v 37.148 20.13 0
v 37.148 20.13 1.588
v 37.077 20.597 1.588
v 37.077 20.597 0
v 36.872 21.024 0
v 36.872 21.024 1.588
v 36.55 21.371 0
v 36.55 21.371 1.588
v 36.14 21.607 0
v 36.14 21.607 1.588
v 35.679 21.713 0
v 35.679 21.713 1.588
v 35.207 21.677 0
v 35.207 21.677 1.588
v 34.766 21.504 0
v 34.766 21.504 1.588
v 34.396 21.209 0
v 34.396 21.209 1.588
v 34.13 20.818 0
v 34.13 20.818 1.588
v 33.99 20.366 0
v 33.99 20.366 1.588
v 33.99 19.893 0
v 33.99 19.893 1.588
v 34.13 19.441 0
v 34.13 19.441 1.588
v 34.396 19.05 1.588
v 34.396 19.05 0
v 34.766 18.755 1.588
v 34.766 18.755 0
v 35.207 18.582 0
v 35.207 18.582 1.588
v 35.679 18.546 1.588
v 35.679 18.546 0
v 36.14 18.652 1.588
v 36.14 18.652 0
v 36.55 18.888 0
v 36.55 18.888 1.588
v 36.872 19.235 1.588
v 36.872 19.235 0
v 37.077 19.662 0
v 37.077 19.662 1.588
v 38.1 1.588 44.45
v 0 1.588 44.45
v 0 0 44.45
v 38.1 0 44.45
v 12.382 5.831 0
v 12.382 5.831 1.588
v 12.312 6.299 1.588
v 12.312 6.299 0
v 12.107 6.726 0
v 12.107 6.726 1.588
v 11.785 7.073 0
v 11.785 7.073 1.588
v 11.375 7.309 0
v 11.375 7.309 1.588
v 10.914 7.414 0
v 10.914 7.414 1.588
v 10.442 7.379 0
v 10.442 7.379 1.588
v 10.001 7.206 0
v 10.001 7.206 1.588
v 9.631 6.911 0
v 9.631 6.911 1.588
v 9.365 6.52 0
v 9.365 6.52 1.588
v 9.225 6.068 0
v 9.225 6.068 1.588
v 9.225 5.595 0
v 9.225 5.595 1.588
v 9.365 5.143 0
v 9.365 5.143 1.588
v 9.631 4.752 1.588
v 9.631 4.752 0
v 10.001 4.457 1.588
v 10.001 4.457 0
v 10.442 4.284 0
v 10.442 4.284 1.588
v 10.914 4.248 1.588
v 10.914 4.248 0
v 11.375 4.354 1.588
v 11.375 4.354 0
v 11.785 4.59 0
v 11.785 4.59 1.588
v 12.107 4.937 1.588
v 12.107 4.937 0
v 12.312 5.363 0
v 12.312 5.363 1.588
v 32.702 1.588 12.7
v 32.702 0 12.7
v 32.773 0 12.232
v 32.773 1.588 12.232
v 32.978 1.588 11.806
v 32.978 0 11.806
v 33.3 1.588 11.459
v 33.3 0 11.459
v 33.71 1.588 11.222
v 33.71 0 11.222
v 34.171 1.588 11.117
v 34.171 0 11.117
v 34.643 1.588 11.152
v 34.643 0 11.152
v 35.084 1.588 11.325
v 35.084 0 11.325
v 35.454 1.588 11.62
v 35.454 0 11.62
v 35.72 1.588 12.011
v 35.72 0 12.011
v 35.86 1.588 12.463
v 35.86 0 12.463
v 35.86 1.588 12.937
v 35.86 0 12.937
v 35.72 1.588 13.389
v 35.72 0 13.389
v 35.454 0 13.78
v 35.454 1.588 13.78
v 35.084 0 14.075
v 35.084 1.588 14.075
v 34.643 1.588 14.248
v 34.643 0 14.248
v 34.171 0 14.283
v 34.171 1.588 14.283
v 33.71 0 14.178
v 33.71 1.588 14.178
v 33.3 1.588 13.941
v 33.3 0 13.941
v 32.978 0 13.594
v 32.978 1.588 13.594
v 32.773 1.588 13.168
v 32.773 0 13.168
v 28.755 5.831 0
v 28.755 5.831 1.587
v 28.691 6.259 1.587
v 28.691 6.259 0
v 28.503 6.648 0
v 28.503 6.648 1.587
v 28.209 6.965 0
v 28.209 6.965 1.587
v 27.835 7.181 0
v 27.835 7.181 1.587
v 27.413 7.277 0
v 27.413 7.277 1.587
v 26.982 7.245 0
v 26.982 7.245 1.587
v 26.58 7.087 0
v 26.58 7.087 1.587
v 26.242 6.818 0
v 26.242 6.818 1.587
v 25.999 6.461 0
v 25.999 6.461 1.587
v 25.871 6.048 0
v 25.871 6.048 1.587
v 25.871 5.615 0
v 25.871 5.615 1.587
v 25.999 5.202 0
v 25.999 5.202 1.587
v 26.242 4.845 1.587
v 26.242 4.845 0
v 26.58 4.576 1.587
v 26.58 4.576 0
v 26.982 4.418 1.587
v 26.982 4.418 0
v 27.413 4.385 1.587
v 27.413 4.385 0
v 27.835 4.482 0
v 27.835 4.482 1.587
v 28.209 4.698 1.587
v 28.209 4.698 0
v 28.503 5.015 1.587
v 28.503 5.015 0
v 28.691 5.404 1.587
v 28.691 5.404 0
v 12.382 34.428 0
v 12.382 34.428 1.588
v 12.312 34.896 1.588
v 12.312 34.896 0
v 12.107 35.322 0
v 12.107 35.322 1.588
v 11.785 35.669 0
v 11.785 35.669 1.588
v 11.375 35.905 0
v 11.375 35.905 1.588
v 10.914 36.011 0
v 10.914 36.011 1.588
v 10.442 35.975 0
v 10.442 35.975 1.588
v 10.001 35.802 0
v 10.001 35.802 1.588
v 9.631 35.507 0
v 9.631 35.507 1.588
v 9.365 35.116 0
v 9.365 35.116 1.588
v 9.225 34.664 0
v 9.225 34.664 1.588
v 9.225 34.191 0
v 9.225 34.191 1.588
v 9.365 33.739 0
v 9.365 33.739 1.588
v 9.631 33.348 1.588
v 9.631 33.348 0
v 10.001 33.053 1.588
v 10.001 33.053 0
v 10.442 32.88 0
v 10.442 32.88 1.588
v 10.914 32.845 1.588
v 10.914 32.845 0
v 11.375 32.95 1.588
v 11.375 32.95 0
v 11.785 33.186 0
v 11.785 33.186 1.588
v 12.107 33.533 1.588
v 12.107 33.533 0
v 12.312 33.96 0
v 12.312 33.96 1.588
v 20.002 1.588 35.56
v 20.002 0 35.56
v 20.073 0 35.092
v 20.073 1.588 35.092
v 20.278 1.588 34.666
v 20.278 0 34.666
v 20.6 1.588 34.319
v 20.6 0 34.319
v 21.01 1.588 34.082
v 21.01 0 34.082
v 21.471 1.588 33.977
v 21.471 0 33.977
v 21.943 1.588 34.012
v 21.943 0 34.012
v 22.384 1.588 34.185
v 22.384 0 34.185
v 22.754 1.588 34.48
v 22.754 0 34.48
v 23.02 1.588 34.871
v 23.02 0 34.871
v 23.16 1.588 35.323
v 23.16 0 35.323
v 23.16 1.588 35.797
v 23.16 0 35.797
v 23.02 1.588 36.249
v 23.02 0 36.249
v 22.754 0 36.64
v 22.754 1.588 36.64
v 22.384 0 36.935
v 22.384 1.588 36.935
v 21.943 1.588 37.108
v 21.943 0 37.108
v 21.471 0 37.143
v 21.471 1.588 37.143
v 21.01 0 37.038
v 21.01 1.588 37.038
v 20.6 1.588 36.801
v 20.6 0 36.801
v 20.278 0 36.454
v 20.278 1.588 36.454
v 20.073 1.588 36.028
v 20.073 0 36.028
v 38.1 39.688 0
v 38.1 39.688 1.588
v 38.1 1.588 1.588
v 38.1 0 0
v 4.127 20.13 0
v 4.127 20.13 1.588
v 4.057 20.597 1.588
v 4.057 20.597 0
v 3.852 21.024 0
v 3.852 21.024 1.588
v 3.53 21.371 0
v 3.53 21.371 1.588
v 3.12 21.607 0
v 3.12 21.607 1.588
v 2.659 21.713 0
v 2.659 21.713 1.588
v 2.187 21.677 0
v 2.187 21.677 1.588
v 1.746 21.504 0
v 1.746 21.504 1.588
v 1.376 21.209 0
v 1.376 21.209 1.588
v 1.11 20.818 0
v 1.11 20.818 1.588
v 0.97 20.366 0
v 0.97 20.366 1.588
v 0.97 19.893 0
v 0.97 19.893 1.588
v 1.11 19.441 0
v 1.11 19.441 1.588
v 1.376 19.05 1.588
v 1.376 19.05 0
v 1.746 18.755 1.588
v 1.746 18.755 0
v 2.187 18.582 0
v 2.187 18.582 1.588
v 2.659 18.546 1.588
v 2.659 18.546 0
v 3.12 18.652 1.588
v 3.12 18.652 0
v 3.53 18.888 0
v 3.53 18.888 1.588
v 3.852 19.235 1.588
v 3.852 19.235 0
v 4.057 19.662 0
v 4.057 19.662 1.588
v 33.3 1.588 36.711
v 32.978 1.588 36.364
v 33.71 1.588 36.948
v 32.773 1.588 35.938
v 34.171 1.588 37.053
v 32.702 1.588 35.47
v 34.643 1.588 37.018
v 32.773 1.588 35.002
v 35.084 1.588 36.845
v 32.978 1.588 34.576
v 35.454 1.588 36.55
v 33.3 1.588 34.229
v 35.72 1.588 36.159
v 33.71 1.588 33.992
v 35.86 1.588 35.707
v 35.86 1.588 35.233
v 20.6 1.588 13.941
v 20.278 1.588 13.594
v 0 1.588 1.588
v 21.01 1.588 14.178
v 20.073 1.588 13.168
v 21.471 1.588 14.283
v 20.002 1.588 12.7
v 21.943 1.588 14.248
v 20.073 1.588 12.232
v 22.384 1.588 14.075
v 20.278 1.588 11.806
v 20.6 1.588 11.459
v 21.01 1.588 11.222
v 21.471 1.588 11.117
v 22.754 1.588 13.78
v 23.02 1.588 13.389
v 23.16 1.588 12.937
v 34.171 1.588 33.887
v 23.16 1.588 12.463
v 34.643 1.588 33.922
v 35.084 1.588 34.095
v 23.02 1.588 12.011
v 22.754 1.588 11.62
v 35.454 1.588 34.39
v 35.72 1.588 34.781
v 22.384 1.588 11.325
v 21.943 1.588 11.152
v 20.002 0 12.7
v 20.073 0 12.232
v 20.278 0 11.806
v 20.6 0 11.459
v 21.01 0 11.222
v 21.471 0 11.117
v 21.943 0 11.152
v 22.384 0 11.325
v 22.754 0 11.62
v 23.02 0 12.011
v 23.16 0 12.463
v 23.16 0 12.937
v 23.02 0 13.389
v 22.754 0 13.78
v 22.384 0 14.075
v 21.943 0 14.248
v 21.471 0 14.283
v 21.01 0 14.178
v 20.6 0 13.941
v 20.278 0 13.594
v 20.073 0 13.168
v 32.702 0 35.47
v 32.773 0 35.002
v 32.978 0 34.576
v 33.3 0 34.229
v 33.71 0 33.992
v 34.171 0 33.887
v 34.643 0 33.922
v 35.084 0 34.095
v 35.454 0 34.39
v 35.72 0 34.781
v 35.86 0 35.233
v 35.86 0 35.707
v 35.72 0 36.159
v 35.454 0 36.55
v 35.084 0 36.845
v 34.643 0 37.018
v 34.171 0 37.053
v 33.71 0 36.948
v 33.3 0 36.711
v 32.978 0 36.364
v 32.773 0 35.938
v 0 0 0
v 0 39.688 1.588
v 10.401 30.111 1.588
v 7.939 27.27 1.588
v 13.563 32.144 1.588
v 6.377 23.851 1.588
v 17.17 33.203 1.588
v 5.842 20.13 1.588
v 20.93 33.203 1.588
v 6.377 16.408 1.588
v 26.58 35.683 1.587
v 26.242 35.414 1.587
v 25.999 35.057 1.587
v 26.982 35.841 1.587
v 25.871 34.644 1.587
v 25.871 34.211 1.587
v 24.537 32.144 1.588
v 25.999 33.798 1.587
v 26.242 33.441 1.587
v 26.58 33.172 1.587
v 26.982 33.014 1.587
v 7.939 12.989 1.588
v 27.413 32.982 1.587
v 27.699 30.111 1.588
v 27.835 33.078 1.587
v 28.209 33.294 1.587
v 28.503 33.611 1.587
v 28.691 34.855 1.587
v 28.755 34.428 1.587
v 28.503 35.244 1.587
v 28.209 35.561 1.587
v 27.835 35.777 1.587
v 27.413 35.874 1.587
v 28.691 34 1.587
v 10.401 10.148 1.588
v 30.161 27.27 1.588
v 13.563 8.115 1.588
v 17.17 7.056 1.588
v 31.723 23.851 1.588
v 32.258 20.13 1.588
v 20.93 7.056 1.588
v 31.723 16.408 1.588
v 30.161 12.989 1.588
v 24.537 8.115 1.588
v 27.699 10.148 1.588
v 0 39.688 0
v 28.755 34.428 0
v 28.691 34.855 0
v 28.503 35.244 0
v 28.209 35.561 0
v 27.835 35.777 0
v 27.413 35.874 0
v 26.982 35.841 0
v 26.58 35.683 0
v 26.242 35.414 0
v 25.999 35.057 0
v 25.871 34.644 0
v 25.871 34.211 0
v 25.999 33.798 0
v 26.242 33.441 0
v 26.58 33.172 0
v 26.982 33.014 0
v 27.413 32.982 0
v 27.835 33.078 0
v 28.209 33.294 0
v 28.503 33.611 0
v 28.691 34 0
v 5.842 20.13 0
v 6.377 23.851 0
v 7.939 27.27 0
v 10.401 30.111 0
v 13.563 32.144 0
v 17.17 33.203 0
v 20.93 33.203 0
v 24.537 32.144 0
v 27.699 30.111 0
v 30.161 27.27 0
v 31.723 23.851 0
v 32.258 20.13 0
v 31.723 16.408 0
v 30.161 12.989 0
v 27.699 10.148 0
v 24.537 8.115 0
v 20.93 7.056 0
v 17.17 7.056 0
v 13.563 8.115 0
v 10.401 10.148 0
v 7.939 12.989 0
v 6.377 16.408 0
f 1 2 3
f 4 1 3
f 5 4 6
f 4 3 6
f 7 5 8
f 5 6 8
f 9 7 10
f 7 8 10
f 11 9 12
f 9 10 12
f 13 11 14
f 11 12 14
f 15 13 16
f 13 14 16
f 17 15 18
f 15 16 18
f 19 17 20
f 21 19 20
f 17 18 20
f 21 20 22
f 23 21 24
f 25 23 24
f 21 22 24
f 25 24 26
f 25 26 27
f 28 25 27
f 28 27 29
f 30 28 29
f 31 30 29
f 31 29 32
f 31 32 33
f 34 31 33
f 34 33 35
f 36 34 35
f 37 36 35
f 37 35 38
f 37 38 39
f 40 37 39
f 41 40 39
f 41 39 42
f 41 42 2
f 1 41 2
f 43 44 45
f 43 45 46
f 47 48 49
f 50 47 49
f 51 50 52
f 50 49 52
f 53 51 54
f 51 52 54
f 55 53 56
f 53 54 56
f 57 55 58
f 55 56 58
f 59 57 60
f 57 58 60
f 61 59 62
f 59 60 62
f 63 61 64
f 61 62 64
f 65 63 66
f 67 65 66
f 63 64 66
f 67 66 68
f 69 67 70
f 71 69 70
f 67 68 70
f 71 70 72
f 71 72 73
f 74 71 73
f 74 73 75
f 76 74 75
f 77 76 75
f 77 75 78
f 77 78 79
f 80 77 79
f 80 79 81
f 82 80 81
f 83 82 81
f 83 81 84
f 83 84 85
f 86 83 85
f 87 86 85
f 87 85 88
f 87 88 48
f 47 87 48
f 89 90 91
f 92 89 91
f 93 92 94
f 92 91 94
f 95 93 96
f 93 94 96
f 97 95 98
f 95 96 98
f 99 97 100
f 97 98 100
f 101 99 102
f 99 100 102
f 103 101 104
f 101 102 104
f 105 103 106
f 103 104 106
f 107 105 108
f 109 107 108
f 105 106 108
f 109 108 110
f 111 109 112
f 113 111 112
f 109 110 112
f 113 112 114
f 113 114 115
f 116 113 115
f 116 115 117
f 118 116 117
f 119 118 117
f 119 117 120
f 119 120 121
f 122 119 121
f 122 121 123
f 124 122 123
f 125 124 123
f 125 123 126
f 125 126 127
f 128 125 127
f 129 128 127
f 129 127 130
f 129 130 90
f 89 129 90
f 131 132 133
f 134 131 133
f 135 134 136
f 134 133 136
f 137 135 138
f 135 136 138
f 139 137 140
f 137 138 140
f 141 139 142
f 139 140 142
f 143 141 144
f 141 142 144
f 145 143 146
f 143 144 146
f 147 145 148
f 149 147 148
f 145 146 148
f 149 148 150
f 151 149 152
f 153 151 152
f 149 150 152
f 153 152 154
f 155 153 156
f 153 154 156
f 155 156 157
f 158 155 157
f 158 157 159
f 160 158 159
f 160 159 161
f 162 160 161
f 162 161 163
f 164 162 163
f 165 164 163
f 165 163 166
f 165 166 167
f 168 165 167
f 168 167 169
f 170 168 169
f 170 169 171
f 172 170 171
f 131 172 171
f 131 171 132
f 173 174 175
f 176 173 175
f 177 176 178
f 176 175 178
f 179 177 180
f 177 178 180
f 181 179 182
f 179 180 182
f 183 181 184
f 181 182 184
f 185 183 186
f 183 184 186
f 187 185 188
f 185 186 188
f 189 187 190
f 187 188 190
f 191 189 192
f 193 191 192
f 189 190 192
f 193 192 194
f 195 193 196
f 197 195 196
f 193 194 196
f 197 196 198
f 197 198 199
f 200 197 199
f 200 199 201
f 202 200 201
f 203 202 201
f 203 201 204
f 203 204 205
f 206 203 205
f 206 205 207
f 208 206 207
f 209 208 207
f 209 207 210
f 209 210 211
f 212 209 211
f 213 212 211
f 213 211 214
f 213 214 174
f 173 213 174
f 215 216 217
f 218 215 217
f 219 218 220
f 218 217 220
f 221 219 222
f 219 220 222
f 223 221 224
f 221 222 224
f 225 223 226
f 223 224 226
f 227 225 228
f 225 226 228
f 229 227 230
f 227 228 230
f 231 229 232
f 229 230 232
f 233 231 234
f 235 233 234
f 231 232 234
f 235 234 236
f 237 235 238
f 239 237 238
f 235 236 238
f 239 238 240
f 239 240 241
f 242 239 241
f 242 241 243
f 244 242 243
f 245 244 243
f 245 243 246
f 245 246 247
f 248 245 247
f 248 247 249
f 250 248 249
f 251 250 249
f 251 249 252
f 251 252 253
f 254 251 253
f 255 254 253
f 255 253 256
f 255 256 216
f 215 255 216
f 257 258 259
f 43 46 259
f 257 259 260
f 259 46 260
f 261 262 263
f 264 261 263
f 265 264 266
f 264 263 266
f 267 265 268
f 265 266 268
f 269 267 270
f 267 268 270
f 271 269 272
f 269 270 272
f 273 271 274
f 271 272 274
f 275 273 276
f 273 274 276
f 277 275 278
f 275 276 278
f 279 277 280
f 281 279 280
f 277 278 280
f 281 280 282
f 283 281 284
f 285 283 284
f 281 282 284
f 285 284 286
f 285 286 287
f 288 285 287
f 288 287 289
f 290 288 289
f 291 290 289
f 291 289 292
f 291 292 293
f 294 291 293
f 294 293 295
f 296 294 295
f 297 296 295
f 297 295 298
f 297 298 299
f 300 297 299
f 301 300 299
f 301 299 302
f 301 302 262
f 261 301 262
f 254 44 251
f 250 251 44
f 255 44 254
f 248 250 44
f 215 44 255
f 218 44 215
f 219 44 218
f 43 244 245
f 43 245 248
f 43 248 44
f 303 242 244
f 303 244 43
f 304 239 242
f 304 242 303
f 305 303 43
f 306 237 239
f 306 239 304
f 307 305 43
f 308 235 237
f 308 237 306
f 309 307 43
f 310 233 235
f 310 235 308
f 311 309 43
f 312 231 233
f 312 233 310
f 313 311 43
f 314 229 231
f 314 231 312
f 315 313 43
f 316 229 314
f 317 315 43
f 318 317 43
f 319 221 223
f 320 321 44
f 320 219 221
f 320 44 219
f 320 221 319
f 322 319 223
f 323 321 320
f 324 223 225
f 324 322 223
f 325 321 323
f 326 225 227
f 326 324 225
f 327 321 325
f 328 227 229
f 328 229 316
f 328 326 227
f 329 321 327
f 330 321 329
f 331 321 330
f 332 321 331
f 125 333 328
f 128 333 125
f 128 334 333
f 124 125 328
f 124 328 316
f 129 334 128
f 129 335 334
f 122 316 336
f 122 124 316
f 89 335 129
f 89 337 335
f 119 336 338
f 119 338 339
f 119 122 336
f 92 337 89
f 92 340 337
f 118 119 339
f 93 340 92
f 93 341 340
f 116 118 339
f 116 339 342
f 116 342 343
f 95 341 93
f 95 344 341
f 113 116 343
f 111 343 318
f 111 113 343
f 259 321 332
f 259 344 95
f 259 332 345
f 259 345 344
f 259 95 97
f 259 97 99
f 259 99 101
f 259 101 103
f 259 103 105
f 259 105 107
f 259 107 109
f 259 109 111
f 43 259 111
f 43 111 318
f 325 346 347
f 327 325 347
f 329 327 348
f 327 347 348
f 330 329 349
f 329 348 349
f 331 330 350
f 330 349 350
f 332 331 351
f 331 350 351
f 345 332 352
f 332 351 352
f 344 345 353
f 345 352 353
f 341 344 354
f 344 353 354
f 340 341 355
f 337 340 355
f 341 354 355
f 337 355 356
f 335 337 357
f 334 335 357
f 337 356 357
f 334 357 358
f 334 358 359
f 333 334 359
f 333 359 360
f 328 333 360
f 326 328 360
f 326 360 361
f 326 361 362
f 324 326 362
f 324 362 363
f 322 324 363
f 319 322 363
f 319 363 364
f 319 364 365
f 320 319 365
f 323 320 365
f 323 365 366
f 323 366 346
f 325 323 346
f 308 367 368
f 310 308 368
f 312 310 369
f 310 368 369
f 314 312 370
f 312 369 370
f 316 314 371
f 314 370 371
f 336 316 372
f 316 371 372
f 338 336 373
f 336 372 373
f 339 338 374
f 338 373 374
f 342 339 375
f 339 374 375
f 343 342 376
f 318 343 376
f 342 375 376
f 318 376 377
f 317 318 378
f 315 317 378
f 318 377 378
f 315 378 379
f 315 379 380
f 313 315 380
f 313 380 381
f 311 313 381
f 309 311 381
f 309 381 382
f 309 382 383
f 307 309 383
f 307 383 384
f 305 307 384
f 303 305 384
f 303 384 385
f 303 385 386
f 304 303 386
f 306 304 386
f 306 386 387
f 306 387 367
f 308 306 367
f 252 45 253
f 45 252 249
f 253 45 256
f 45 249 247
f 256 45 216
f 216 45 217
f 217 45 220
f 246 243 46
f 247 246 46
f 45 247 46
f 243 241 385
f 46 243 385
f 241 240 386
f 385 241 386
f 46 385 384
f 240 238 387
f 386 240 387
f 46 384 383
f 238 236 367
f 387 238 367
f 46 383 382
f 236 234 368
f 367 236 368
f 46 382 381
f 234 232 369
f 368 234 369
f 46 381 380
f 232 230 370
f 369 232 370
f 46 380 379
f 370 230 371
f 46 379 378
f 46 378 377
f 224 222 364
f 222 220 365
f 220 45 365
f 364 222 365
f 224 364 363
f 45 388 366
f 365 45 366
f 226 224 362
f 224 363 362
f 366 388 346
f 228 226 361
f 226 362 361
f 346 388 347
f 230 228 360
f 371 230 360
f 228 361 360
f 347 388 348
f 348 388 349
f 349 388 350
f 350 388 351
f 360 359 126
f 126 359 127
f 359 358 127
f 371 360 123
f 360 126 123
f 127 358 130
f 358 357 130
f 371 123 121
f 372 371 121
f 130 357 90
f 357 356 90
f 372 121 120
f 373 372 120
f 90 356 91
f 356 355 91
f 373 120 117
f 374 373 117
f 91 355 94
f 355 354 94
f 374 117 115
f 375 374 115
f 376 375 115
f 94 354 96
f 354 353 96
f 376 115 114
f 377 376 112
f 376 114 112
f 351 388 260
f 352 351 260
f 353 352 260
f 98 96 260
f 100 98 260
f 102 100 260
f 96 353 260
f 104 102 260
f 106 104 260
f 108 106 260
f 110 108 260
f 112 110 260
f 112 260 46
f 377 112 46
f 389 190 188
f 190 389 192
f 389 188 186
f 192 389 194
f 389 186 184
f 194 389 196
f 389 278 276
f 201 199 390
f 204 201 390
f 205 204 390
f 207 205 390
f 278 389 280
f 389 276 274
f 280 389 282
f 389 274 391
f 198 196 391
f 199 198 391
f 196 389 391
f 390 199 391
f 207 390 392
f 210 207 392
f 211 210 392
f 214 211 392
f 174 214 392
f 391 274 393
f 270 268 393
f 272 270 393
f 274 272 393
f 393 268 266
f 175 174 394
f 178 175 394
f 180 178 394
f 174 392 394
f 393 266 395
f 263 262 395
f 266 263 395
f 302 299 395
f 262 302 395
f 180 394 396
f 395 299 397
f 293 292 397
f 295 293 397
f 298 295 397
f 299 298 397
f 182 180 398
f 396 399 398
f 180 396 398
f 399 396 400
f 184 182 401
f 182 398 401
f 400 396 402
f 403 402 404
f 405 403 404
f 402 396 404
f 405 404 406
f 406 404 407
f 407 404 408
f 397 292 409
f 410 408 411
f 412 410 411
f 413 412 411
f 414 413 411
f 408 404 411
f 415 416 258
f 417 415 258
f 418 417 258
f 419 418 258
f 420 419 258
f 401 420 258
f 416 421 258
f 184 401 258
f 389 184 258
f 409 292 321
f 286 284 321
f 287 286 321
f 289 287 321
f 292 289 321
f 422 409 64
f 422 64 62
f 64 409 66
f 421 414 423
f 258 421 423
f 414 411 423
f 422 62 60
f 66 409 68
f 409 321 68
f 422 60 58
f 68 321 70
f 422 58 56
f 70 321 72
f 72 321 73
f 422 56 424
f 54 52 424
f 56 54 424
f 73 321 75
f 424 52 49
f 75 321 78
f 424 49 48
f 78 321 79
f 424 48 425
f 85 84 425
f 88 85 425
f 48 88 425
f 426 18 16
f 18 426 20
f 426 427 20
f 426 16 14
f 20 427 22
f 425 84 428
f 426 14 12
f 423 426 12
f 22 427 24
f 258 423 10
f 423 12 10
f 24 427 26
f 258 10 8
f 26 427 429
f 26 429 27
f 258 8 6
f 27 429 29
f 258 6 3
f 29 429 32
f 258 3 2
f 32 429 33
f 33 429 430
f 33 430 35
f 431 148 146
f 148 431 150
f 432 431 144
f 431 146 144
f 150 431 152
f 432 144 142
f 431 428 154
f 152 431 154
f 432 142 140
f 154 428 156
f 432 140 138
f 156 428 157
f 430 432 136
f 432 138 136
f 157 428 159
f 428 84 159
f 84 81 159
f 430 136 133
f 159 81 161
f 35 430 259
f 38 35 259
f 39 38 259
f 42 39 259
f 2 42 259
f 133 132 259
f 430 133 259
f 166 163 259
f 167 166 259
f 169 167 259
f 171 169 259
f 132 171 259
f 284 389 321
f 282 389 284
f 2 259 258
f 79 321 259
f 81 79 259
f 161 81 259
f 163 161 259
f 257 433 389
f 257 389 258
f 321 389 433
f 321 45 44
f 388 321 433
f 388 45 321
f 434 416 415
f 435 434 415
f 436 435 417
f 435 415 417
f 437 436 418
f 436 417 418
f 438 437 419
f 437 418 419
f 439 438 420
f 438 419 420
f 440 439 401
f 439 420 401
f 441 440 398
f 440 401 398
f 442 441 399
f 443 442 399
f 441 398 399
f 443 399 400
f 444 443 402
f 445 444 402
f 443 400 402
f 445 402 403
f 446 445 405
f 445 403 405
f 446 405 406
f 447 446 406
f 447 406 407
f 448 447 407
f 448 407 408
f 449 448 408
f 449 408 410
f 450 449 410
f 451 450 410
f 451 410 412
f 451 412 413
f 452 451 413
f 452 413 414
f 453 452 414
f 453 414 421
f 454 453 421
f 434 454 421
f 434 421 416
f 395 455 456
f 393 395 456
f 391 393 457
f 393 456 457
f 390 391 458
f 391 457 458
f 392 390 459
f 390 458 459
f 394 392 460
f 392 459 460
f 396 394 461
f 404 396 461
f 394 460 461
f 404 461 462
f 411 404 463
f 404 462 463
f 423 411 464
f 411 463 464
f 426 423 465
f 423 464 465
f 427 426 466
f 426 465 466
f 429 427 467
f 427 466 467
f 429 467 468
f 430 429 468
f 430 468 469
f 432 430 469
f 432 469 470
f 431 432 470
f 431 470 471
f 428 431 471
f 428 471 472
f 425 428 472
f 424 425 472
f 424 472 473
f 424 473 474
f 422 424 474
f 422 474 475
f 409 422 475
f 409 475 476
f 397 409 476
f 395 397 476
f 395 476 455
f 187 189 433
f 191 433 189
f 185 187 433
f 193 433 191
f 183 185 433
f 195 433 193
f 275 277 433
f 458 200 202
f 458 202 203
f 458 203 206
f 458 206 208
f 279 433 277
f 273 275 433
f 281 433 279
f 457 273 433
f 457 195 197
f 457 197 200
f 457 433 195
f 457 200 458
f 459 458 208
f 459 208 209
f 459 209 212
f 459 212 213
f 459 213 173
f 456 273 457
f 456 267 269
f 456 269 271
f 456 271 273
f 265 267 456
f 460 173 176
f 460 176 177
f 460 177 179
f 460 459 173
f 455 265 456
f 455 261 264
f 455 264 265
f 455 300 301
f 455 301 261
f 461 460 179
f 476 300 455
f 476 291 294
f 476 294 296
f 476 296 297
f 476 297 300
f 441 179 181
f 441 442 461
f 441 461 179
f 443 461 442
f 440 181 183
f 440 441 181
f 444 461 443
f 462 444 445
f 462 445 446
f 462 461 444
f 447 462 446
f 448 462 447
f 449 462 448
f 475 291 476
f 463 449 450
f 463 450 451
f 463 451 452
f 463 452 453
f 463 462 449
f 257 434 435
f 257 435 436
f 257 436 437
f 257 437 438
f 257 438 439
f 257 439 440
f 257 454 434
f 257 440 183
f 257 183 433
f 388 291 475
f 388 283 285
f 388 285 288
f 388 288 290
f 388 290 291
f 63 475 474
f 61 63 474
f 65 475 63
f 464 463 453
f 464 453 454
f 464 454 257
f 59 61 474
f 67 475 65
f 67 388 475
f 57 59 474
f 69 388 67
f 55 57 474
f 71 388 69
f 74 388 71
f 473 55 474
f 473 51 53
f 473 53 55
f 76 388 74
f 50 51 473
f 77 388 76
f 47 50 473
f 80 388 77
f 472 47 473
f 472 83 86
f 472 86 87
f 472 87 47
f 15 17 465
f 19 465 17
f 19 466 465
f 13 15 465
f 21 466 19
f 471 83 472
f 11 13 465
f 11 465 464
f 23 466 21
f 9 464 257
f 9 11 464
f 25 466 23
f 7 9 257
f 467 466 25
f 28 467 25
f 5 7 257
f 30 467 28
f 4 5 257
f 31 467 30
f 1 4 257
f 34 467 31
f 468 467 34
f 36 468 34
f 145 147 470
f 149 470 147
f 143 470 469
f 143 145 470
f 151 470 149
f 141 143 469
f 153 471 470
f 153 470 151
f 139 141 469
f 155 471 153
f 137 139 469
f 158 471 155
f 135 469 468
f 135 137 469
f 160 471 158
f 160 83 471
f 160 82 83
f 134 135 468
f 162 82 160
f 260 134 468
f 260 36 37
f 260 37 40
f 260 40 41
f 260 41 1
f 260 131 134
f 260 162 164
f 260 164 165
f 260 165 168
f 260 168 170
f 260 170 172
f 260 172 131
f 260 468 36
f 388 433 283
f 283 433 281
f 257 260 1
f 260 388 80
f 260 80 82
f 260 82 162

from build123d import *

# Parameters (mm, degrees)
SKETCH1_W                      = 38.1
SKETCH1_H                      = 1.5875
BOSS_EXTRUDE1_DEPTH            = 44.45
SKETCH2_W                      = 38.1
SKETCH2_H                      = 1.5875
BOSS_EXTRUDE2_DEPTH            = 38.1
SKETCH3_R                      = 13.208
CUT_EXTRUDE1_DEPTH             = 71.728425377
F_1_8_0_125_DIAMETER_HOLE3_D   = 3.175
F_1_8_0_125_DIAMETER_HOLE4_D   = 3.175
F_2_9_2_9_DIAMETER_HOLE1_D     = 2.9
F_2_9_2_9_DIAMETER_HOLE1_DEPTH = 3.556
F_2_9_2_9_DIAMETER_HOLE1_TIP   = 0.871247898


with BuildPart() as part:
    # Sketch1 → Boss-Extrude1 (new body)
    with BuildSketch(Plane.XY):
        with Locations((19.05, 0.79375)):
            Rectangle(SKETCH1_W, SKETCH1_H)
    extrude(amount=BOSS_EXTRUDE1_DEPTH)

    # Sketch2 → Boss-Extrude2 (add)
    with BuildSketch(Plane(origin=(0, 1.5875, 0), x_dir=(1, 0, 0), z_dir=(0, 1, 0))):
        with Locations((19.05, -0.79375)):
            Rectangle(SKETCH2_W, SKETCH2_H)
    extrude(amount=BOSS_EXTRUDE2_DEPTH)

    # Sketch3 → Cut-Extrude1 (cut, through all)
    with BuildSketch(Plane(origin=(0, 0, 0), x_dir=(-1, 0, 0), z_dir=(0, 0, -1))):
        with Locations((-19.05, 20.1295)):
            Circle(SKETCH3_R)
    extrude(amount=-CUT_EXTRUDE1_DEPTH, mode=Mode.SUBTRACT)

    # 1/8 (0.125) Diameter Hole3 (through all)
    with Locations(Plane(origin=(0, 0, 0), x_dir=(-1, 0, 0), z_dir=(0, 0, -1))):
        with Locations((-35.56, 20.1295), (-10.795, 34.427579416), (-2.54, 20.1295), (-10.795, 5.831420584)):
            Hole(F_1_8_0_125_DIAMETER_HOLE3_D / 2)

    # 1/8 (0.125) Diameter Hole4 (through all)
    with Locations(Plane(origin=(0, 1.5875, 0), x_dir=(1, 0, 0), z_dir=(0, 1, 0))):
        with Locations((34.29, -12.7), (21.59, -12.7), (21.59, -35.56), (34.29, -35.469930371)):
            Hole(F_1_8_0_125_DIAMETER_HOLE4_D / 2)

    # Ø2.9 (2.9) Diameter Hole1
    with Locations(Plane(origin=(0, 0, 0), x_dir=(-1, 0, 0), z_dir=(0, 0, -1))):
        with Locations((-27.305, 5.831420584), (-27.305, 34.427579416)):
            Hole(F_2_9_2_9_DIAMETER_HOLE1_D / 2, depth=F_2_9_2_9_DIAMETER_HOLE1_DEPTH)
            with Locations((0, 0, -(F_2_9_2_9_DIAMETER_HOLE1_DEPTH + F_2_9_2_9_DIAMETER_HOLE1_TIP / 2))):  # 118° drill point
                Cone(0, F_2_9_2_9_DIAMETER_HOLE1_D / 2, F_2_9_2_9_DIAMETER_HOLE1_TIP, mode=Mode.SUBTRACT)


solid = part.part
